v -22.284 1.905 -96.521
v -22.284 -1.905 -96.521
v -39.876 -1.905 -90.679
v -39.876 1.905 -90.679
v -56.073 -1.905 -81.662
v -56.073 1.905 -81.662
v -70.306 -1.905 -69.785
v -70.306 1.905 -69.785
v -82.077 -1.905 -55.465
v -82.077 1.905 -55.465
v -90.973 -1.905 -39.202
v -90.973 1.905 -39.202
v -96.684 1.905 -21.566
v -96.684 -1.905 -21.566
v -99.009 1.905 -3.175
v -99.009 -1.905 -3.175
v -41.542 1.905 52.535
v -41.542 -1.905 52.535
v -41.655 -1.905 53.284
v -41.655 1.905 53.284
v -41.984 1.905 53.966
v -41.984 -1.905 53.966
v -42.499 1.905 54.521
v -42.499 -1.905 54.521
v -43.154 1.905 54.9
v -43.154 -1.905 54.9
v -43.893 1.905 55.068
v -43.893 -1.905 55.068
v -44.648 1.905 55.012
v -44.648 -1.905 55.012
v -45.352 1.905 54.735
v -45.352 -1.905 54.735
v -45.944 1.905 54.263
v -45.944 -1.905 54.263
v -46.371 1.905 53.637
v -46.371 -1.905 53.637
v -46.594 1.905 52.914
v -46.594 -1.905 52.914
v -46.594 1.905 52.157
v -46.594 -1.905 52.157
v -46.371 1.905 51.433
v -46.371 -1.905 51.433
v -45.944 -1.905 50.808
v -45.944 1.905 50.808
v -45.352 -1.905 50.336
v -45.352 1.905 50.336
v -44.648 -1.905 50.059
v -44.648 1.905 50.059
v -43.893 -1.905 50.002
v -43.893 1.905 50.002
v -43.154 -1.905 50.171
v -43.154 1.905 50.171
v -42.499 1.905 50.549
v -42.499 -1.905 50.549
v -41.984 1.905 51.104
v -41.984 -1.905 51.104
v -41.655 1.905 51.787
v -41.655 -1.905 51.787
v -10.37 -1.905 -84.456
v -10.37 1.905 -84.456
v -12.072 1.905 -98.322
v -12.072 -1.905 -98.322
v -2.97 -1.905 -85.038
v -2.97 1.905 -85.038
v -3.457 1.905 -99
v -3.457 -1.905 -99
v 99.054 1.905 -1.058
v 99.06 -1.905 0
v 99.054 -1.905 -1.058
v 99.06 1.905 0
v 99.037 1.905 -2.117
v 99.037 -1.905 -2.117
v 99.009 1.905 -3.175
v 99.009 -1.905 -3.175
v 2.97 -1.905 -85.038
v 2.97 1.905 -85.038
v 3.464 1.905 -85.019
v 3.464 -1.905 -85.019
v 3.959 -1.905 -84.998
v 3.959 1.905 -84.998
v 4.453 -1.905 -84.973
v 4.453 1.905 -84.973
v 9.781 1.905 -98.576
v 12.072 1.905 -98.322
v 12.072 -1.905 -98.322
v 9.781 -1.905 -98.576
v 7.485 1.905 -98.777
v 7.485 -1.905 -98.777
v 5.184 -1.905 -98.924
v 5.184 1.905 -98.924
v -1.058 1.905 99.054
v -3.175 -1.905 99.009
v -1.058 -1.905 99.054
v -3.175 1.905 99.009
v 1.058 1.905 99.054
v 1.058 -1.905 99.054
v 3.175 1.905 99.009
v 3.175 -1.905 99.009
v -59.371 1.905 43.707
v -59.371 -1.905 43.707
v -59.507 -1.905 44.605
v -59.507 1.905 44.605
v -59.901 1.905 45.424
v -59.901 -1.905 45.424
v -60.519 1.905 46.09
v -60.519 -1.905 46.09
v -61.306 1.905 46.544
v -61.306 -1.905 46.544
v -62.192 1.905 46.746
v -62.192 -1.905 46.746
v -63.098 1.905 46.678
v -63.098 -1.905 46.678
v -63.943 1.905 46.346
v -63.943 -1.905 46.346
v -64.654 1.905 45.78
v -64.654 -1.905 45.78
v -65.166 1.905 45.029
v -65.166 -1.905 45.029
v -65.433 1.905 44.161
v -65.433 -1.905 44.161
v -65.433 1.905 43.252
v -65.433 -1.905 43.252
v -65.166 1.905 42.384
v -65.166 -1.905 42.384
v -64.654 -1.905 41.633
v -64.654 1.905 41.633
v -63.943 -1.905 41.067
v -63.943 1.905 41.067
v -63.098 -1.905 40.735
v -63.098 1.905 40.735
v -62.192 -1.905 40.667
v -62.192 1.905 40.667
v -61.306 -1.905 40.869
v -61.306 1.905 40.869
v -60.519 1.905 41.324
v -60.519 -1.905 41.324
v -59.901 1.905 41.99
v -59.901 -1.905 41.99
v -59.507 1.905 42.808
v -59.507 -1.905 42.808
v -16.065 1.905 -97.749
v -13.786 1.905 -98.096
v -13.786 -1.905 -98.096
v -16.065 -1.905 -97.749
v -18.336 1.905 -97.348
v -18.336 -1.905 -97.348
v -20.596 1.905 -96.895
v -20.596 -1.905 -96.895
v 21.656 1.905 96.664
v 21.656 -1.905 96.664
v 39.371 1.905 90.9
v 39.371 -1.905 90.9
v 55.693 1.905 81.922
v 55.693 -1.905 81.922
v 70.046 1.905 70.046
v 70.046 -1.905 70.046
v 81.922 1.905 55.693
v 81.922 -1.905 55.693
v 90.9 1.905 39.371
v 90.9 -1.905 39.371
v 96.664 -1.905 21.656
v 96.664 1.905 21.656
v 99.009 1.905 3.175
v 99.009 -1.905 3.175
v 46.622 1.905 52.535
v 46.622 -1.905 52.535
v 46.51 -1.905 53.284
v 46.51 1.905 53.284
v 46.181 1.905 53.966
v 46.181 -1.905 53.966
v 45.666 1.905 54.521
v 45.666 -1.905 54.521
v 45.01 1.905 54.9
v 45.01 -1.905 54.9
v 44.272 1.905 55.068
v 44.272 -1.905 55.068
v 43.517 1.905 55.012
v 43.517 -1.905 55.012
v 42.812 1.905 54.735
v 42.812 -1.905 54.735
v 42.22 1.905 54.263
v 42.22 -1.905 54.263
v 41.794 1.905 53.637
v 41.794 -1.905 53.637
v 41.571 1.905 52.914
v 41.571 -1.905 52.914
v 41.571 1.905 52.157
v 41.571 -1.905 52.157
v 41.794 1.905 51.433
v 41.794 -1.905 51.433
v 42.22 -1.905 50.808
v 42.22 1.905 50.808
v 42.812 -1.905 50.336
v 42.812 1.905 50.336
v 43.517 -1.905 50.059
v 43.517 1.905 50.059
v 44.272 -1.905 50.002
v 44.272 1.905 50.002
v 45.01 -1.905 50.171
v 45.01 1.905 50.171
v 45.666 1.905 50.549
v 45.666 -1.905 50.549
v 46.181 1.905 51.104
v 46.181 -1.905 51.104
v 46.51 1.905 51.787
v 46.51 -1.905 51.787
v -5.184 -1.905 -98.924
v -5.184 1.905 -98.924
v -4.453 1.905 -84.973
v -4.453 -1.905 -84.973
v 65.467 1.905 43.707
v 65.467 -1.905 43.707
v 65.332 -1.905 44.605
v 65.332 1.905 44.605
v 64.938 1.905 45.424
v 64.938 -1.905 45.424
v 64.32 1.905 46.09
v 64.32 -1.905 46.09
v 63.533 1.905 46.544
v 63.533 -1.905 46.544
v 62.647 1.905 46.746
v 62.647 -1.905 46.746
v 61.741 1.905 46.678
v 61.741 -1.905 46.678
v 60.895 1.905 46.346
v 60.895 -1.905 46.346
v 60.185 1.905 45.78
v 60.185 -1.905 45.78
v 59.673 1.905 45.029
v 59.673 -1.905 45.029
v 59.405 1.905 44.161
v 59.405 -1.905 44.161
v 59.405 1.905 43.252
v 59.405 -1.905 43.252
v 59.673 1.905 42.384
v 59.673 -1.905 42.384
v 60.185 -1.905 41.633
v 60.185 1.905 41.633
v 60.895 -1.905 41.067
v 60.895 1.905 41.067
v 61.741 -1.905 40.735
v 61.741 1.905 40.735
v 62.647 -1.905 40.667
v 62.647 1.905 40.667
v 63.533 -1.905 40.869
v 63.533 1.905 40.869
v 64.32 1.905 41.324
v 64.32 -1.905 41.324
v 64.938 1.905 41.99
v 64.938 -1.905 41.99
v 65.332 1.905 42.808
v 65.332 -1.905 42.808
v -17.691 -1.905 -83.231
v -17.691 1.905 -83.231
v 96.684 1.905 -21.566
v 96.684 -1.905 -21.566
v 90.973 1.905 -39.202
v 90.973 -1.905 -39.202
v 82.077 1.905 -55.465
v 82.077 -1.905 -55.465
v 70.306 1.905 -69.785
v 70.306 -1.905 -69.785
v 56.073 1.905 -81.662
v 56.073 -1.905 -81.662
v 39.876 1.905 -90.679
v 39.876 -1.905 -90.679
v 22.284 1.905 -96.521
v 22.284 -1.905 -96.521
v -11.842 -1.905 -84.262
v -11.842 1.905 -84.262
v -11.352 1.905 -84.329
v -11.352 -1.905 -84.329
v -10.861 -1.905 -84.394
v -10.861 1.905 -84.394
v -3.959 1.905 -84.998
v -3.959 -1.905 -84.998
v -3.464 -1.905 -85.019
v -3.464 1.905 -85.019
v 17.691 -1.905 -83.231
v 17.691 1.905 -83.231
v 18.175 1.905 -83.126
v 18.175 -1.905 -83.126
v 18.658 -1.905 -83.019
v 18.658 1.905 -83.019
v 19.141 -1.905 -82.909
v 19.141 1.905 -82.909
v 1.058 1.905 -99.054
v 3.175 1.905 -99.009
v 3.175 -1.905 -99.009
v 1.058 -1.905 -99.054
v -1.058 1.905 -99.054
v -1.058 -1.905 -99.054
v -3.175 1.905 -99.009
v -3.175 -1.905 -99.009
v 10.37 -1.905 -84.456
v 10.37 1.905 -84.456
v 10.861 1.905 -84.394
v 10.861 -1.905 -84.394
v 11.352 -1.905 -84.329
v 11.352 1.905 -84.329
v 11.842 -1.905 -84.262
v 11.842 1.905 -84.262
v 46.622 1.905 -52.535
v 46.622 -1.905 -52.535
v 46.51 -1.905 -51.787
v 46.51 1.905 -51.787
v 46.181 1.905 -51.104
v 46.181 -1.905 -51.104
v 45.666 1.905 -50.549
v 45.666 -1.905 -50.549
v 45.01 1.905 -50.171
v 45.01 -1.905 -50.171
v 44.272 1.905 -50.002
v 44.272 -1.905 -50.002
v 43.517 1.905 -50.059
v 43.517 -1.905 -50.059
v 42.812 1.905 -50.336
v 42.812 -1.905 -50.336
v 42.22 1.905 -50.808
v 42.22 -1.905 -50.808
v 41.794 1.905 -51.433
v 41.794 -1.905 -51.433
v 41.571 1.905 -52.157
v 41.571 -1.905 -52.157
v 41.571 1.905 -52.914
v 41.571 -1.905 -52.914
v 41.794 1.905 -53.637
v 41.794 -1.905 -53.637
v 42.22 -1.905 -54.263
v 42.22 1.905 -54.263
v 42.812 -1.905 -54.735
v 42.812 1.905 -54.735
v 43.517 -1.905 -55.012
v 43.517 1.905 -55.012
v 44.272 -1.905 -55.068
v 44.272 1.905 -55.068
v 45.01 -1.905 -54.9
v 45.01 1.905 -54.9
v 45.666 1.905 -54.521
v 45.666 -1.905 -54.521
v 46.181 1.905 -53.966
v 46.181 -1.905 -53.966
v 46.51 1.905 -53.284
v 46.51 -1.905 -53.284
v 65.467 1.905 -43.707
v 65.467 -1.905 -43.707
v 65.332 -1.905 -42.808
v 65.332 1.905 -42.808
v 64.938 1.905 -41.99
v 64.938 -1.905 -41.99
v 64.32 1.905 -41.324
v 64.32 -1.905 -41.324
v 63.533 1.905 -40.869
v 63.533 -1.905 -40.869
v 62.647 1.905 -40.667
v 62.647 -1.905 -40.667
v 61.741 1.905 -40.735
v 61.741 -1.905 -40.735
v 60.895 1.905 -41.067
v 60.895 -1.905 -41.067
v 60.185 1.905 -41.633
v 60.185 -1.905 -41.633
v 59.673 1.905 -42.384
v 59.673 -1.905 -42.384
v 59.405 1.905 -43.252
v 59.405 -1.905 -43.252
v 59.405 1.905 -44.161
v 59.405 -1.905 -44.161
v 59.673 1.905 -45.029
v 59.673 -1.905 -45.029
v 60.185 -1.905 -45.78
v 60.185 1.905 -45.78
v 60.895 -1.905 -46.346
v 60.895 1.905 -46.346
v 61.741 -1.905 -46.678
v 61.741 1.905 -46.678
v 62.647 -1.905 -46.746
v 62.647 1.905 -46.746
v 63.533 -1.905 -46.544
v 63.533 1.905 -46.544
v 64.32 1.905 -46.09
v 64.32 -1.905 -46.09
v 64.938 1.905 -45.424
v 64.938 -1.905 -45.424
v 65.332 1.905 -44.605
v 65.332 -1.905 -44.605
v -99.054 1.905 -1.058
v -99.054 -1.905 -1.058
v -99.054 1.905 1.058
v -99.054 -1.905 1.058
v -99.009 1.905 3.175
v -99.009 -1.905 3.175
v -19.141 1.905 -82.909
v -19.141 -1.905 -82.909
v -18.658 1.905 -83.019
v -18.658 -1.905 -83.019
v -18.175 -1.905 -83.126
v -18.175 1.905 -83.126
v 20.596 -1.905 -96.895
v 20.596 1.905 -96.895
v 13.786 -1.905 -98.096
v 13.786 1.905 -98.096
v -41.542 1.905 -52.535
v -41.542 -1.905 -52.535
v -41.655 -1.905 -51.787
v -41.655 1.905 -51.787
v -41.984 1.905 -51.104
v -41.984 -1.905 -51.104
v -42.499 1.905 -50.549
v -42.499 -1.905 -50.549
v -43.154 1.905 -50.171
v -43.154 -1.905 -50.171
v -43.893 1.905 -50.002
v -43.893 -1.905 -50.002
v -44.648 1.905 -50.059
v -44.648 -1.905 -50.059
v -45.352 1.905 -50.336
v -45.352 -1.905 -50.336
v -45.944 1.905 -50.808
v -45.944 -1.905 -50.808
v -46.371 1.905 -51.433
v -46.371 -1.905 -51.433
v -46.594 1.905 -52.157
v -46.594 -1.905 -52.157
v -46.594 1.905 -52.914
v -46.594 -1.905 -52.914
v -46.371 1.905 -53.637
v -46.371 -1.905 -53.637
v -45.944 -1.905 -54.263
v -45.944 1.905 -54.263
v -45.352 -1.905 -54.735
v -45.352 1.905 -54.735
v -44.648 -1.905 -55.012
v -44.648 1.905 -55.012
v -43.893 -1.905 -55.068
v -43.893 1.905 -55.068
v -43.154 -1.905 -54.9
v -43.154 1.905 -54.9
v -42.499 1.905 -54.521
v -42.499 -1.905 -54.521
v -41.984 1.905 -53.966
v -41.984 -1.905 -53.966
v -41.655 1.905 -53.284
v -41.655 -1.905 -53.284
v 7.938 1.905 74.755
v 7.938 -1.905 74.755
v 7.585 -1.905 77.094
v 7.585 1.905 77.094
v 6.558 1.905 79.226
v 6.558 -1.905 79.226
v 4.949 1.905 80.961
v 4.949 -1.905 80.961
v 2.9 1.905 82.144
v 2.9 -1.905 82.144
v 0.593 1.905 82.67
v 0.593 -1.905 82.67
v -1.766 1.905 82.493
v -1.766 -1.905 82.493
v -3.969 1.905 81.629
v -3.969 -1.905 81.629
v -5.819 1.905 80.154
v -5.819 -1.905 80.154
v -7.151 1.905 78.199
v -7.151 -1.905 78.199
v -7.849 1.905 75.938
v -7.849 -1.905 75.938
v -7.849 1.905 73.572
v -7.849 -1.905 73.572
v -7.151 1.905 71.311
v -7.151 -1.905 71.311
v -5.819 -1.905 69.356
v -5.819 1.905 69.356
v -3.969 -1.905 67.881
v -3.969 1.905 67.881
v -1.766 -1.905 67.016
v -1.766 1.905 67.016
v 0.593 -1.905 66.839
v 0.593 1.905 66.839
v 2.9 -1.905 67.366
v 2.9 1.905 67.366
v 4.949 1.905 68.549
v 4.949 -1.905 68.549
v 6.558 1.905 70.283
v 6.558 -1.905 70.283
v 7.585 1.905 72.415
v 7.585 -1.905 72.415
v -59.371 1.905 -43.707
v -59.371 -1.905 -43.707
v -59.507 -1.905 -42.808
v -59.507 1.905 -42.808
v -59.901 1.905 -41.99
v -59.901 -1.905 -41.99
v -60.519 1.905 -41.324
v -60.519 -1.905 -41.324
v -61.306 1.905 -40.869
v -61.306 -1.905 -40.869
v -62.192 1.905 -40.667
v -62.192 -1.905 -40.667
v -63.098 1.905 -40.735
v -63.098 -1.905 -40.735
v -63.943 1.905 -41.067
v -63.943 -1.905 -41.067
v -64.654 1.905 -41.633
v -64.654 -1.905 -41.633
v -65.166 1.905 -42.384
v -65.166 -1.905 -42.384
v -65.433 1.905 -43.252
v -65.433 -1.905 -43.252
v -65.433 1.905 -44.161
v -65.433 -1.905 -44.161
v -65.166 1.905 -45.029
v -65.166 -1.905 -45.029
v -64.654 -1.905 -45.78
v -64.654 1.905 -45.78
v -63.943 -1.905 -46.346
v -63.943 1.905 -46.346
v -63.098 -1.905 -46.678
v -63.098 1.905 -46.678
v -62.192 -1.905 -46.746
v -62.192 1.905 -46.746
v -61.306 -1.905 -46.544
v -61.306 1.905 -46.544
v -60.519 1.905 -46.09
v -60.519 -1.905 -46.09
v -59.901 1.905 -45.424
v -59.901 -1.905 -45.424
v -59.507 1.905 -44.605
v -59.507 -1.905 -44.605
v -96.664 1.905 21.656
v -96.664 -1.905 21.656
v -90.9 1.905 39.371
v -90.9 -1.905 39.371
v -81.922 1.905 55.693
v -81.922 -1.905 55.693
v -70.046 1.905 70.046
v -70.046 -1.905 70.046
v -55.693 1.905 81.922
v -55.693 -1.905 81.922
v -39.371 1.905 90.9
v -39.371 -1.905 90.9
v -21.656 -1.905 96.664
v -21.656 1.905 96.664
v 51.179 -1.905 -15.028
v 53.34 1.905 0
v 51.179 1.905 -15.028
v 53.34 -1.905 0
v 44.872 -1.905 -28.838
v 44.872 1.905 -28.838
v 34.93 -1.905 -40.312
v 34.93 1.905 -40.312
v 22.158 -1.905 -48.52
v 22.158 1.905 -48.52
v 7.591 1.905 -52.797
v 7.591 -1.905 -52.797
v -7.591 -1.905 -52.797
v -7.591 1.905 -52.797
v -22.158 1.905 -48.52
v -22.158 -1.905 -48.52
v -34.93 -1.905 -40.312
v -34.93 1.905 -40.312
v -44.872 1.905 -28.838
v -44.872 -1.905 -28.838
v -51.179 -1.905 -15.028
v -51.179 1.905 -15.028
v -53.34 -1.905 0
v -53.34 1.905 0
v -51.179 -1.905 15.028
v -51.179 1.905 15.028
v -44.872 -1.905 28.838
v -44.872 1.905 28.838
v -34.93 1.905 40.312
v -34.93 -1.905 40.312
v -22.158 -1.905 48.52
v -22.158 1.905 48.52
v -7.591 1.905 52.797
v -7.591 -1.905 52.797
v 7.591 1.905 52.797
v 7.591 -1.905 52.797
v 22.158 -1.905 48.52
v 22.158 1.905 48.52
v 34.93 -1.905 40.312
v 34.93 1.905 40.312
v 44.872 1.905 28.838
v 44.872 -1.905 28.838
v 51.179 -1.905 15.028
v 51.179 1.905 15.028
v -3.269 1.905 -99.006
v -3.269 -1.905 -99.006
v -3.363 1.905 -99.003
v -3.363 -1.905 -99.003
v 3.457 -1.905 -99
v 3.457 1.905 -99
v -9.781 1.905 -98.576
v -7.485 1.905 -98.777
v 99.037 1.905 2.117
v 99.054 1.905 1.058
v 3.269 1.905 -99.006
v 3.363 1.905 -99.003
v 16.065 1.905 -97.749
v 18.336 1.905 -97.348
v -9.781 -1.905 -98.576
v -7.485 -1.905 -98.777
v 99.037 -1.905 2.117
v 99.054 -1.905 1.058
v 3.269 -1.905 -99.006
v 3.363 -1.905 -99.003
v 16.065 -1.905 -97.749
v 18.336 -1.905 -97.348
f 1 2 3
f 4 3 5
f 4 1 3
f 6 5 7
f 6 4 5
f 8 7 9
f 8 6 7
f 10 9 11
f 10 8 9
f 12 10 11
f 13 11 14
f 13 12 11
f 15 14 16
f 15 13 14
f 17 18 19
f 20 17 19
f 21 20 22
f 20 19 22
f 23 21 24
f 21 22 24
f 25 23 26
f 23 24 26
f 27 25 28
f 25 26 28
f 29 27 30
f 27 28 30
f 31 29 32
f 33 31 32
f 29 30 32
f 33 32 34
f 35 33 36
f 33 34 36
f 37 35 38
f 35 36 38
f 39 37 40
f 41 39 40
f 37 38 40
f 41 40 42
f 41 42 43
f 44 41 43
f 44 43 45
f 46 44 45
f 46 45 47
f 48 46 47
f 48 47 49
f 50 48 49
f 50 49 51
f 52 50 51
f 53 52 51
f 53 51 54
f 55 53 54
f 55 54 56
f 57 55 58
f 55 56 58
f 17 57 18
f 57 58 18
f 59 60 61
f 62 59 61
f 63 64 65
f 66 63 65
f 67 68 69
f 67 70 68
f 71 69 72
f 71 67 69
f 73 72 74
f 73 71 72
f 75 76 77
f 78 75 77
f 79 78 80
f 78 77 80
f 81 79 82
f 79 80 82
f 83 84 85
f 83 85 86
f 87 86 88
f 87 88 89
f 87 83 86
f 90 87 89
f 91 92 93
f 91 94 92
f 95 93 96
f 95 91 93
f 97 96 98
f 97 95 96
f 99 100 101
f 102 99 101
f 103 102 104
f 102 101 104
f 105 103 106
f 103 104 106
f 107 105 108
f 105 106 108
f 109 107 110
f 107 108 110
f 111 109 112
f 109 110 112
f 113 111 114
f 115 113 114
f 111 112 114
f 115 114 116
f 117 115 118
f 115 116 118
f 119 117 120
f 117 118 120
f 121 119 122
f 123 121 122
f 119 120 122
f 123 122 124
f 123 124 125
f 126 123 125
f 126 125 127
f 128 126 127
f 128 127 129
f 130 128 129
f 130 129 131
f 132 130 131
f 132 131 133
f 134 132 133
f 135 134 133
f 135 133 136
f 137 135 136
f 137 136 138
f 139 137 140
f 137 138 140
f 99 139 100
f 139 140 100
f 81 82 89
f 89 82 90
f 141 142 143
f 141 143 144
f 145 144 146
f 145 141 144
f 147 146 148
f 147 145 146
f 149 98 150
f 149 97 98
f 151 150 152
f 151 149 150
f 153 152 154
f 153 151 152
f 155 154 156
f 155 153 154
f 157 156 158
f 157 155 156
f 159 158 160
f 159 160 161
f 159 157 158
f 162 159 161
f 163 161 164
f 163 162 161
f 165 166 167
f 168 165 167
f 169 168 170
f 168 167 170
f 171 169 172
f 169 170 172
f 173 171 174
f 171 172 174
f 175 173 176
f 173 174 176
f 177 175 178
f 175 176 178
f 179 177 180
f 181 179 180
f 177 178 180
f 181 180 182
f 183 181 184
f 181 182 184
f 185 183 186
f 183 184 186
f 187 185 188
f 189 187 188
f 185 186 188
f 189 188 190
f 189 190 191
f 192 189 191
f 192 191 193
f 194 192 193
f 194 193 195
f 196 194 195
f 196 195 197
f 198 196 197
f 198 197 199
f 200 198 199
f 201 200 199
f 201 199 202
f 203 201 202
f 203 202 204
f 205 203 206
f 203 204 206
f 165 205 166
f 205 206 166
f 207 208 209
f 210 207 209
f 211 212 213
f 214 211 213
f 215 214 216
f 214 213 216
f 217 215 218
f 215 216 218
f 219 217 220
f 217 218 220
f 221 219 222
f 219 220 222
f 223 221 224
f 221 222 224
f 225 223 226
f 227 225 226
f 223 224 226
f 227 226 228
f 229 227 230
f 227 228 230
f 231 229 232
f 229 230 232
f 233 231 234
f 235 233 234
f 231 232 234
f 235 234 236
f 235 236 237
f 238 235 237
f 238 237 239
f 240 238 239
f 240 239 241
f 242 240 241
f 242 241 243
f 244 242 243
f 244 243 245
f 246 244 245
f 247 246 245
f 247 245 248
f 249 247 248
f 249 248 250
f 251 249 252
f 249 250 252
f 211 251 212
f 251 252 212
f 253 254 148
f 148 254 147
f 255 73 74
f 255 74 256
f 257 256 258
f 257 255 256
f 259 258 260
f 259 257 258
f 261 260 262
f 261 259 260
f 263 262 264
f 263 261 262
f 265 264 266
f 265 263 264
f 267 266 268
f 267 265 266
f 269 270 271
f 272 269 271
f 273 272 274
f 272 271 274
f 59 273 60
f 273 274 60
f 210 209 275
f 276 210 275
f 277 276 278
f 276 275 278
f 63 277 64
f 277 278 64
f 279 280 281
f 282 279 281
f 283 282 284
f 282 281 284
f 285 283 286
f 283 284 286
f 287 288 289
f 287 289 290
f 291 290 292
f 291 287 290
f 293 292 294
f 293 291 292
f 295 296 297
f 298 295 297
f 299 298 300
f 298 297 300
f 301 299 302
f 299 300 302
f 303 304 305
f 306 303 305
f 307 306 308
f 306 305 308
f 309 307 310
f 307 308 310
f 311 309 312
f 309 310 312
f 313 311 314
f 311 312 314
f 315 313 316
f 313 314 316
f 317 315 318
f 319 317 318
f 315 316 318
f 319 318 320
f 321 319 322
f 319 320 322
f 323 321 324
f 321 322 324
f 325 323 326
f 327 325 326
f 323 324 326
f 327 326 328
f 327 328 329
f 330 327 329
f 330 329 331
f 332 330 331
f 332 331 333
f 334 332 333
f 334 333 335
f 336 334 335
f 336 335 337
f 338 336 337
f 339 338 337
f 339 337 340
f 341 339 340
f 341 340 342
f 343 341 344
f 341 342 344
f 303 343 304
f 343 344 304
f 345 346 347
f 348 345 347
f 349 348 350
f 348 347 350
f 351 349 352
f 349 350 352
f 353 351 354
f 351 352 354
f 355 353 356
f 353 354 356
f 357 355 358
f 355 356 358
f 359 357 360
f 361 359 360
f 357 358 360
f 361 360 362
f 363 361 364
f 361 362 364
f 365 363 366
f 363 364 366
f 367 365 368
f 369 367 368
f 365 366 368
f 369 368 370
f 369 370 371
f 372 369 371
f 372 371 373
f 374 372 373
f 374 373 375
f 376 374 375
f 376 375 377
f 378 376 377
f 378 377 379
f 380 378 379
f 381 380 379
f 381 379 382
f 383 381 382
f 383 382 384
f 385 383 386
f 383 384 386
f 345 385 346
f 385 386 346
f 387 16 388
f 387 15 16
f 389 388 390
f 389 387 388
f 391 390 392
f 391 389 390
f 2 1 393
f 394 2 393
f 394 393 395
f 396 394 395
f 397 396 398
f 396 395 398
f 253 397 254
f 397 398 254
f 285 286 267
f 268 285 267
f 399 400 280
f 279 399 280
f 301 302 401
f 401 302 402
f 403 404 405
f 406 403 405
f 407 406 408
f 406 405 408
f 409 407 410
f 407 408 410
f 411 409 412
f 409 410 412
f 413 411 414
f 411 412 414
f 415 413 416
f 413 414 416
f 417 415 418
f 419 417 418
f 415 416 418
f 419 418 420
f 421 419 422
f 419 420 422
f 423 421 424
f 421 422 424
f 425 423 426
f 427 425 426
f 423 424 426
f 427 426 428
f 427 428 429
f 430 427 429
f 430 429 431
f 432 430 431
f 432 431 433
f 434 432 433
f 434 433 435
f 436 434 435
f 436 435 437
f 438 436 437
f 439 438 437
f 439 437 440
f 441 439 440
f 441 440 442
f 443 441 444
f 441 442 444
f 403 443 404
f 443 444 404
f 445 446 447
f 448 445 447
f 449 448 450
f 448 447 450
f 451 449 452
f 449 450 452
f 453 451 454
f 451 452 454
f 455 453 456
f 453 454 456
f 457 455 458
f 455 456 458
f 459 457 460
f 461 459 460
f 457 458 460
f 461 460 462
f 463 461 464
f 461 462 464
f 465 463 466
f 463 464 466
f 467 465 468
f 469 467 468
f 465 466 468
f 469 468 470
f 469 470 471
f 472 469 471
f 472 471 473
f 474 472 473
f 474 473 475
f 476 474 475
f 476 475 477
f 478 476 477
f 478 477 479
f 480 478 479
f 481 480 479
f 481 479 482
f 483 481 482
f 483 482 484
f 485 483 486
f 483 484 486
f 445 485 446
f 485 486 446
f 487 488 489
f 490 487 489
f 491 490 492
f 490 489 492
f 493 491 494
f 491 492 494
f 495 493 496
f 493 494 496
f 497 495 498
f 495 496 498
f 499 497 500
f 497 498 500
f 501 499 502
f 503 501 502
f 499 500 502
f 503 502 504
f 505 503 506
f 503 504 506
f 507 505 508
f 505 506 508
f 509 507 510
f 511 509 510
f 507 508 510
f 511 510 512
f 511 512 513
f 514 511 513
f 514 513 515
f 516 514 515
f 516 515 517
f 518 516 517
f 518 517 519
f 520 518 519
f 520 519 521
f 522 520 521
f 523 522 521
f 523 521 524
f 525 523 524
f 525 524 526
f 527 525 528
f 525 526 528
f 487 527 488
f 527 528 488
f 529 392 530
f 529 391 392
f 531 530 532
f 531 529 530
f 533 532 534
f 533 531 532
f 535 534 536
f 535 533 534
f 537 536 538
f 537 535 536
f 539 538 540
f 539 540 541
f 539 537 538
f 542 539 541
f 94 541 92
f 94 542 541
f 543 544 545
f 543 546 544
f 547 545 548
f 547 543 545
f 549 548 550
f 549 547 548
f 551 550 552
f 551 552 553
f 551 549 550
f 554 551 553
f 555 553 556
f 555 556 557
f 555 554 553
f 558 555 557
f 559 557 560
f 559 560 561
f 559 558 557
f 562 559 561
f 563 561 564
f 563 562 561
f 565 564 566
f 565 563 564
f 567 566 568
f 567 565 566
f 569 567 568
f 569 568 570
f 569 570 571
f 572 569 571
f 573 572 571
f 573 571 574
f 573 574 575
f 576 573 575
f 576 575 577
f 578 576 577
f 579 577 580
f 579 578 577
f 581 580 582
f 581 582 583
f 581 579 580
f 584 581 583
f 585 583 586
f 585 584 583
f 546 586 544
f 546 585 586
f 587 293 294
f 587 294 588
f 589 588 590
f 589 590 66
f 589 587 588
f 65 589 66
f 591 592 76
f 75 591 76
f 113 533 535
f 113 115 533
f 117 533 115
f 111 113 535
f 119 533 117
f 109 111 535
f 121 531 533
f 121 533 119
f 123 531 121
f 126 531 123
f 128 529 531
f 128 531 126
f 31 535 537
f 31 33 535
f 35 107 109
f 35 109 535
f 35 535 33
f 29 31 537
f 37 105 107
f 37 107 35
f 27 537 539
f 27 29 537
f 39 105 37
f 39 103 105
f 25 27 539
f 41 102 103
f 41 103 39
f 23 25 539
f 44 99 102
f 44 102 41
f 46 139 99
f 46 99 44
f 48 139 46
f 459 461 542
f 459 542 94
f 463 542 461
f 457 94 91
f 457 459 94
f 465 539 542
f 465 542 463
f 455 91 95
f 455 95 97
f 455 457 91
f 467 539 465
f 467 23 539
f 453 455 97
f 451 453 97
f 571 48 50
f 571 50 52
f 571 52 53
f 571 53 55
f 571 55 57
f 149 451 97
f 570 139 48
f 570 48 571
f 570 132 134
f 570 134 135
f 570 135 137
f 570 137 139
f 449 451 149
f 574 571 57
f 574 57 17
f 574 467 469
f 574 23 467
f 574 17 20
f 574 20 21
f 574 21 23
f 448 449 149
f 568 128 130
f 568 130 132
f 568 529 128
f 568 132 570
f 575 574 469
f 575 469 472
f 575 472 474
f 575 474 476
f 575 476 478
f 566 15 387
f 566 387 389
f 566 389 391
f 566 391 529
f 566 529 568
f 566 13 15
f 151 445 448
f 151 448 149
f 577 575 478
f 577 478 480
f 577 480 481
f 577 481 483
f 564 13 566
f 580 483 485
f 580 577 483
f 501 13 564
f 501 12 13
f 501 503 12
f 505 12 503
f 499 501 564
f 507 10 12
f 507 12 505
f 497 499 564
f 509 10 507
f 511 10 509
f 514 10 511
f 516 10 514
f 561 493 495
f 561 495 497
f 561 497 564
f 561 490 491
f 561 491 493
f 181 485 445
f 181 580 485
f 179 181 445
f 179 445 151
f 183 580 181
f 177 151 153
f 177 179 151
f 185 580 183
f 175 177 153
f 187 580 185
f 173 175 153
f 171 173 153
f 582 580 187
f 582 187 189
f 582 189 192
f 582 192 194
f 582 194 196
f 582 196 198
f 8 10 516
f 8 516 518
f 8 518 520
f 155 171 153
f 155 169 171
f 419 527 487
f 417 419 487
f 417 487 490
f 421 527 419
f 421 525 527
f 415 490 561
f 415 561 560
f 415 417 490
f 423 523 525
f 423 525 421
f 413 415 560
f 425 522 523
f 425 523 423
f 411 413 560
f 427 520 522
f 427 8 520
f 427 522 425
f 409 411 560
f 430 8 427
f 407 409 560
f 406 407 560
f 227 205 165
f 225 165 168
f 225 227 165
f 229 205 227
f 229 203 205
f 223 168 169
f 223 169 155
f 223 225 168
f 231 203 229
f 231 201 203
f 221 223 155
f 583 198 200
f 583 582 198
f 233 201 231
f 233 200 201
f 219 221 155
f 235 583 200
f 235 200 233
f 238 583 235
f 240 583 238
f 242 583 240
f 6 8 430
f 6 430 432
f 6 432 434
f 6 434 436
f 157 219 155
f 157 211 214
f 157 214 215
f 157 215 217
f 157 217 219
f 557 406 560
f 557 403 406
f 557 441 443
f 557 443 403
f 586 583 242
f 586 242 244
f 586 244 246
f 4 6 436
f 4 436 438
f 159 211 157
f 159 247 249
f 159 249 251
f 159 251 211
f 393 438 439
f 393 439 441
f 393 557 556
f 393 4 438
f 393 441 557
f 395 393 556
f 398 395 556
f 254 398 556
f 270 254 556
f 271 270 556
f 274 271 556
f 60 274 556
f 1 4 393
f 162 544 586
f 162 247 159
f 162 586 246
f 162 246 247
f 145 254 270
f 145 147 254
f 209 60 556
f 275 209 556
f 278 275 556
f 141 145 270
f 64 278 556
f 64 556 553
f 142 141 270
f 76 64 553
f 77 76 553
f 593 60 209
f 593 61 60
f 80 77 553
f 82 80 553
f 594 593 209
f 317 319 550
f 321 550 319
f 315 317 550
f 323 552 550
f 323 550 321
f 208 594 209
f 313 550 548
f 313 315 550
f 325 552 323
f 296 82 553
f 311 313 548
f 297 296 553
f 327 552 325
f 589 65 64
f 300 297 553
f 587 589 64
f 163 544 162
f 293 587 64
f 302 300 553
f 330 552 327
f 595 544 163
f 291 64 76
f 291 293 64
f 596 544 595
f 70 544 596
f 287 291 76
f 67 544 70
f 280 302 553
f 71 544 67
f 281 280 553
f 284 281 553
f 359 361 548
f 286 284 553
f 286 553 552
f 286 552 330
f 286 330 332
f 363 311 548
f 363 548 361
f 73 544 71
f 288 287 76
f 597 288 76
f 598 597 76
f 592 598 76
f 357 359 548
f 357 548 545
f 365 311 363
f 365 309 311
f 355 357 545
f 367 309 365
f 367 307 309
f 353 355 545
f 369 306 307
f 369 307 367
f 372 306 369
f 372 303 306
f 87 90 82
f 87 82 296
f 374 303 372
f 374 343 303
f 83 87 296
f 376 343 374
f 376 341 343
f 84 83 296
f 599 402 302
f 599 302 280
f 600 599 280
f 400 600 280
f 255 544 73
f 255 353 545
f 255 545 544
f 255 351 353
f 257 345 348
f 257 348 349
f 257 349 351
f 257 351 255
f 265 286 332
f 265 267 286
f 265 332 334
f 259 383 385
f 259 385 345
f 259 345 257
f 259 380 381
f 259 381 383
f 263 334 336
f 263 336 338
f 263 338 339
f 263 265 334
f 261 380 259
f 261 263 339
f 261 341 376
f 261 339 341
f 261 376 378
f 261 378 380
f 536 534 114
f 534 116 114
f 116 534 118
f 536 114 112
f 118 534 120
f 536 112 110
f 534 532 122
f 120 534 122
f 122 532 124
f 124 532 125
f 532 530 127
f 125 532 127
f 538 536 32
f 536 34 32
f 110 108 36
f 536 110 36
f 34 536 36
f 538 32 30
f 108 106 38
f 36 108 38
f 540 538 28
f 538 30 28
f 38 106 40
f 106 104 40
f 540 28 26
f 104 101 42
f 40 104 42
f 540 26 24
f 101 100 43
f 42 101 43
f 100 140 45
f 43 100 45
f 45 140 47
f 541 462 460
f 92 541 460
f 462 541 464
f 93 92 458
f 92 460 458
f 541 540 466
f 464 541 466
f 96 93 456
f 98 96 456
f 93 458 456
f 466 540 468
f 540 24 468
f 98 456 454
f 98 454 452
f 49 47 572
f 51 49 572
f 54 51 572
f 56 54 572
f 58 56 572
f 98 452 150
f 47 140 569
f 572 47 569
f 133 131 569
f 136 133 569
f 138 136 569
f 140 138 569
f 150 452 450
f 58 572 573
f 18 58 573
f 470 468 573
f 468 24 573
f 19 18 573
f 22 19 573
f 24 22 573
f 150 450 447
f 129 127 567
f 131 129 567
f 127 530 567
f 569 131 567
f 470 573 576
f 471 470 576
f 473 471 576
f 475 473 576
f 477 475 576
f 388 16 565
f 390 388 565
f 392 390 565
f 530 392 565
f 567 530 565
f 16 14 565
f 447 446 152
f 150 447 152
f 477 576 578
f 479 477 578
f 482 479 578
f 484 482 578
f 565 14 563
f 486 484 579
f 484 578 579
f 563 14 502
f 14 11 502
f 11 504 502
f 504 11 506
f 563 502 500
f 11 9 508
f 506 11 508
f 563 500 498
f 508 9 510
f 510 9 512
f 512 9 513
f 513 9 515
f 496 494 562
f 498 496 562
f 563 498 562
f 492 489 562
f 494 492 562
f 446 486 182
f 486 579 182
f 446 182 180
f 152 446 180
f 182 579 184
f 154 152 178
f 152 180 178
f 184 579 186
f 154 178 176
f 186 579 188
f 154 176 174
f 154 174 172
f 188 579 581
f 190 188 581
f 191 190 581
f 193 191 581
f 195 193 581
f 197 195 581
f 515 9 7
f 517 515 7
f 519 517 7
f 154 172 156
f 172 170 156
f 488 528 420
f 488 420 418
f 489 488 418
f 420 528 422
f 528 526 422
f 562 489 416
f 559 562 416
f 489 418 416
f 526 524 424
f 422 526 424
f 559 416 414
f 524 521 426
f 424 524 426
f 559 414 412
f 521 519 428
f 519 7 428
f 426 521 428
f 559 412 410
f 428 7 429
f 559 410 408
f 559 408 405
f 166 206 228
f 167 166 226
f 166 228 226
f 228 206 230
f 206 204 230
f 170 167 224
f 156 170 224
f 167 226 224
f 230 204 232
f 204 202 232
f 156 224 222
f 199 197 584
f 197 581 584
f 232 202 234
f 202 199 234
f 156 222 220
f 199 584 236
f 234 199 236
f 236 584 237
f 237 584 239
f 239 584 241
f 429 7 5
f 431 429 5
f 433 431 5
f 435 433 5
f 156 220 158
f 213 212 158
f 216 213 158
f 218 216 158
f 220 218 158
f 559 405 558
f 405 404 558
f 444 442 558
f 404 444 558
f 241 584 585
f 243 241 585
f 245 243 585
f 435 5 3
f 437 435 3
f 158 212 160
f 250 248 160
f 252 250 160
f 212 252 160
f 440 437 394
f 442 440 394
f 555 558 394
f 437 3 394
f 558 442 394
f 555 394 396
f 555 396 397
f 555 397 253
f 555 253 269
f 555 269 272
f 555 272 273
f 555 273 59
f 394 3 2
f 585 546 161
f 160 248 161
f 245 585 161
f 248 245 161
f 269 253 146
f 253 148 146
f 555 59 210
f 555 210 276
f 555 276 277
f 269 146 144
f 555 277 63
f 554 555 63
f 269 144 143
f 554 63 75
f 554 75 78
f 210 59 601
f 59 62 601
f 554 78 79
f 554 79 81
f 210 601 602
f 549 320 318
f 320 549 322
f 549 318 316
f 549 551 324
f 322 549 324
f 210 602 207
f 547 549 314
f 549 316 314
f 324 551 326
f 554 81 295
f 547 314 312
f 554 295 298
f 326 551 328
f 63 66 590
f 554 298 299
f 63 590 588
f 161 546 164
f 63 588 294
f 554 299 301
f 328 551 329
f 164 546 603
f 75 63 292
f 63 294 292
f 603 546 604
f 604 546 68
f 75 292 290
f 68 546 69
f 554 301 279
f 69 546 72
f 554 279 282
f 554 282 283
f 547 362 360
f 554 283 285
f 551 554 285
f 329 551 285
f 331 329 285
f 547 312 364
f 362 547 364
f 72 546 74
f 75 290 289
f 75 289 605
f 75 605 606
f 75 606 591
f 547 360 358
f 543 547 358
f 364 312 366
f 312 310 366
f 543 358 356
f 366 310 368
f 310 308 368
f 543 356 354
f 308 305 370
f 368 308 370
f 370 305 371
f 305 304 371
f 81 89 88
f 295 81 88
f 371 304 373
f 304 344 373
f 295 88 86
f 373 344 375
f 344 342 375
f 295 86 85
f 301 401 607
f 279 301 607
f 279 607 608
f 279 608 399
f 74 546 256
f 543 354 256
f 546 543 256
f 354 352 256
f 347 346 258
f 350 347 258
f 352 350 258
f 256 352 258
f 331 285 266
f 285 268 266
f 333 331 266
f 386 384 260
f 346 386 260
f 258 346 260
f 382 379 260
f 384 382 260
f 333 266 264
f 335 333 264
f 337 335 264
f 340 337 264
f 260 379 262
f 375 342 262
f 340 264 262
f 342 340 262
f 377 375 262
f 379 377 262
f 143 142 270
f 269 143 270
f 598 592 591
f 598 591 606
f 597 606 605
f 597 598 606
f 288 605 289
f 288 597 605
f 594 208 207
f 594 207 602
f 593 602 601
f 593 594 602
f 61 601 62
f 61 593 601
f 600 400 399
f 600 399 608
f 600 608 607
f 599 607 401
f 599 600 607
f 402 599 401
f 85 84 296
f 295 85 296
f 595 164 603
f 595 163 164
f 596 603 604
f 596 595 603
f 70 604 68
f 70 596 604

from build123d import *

# Parameters (mm, degrees)
F_98MM_6ID_CENTERING_RING_SKETCH_R = 53.34
CENTERING_RING_EXTRUDE_DEPTH       = 1.905
CENTERING_RING_EXTRUDE_DEPTH_BACK  = 1.905
CUT_EXTRUDE3_DEPTH                 = 4.81
CIRPATTERN1_COUNT                  = 6
CIRPATTERN1_ANGLE                  = 25
SKETCH5_R                          = 3.048
SKETCH5_R_2                        = 2.54
SKETCH5_R_3                        = 7.9375
CUT_EXTRUDE4_DEPTH                 = 3.81


with BuildPart() as part:
    # 98mm - 6ID centering ring sketch → Centering Ring Extrude (new body, two sides)
    with BuildSketch(Plane(origin=(0, 0, 0), x_dir=(1, 0, 0), z_dir=(0, 1, 0))) as centering_ring_extrude_sk:
        with BuildLine():
            Line((56.425744124, 3.175), (99.009105516, 3.175))
            ThreePointArc((99.009105516, 3.175), (70.045997744, 70.045997744), (3.175, 99.009105516))
            Line((3.175, 99.009105516), (3.175, 56.425744124))
            ThreePointArc((3.175, 56.425744124), (0, 56.515), (-3.175, 56.425744124))
            Line((-3.175, 56.425744124), (-3.175, 99.009105516))
            ThreePointArc((-3.175, 99.009105516), (-70.045997744, 70.045997744), (-99.009105516, 3.175))
            Line((-99.009105516, 3.175), (-56.425744124, 3.175))
            ThreePointArc((-56.425744124, 3.175), (-56.515, 0), (-56.425744124, -3.175))
            Line((-56.425744124, -3.175), (-99.009105516, -3.175))
            ThreePointArc((-99.009105516, -3.175), (-70.045997744, -70.045997744), (-3.175, -99.009105516))
            Line((-3.175, -99.009105516), (-3.175, -56.425744124))
            ThreePointArc((-3.175, -56.425744124), (0, -56.515), (3.175, -56.425744124))
            Line((3.175, -56.425744124), (3.175, -99.009105516))
            ThreePointArc((3.175, -99.009105516), (70.045997744, -70.045997744), (99.009105516, -3.175))
            Line((99.009105516, -3.175), (56.425744124, -3.175))
            ThreePointArc((56.425744124, -3.175), (56.515, 0), (56.425744124, 3.175))
        make_face()
        Circle(F_98MM_6ID_CENTERING_RING_SKETCH_R, mode=Mode.SUBTRACT)
        with BuildLine():
            ThreePointArc((99.06, 0), (99.047275562, 1.587703943), (99.009105516, 3.175))
            Line((99.009105516, 3.175), (56.425744124, 3.175))
            ThreePointArc((56.425744124, 3.175), (56.515, 0), (56.425744124, -3.175))
            Line((56.425744124, -3.175), (99.009105516, -3.175))
            ThreePointArc((99.009105516, -3.175), (99.047275562, -1.587703943), (99.06, 0))
        make_face()
        with BuildLine():
            Line((3.175, 56.425744124), (3.175, 99.009105516))
            ThreePointArc((3.175, 99.009105516), (0, 99.06), (-3.175, 99.009105516))
            Line((-3.175, 99.009105516), (-3.175, 56.425744124))
            ThreePointArc((-3.175, 56.425744124), (0, 56.515), (3.175, 56.425744124))
        make_face()
        with BuildLine():
            Line((-56.425744124, 3.175), (-99.009105516, 3.175))
            ThreePointArc((-99.009105516, 3.175), (-99.06, 0), (-99.009105516, -3.175))
            Line((-99.009105516, -3.175), (-56.425744124, -3.175))
            ThreePointArc((-56.425744124, -3.175), (-56.515, 0), (-56.425744124, 3.175))
        make_face()
        with BuildLine():
            ThreePointArc((-3.175, -99.009105516), (0, -99.06), (3.175, -99.009105516))
            Line((3.175, -99.009105516), (3.175, -56.425744124))
            ThreePointArc((3.175, -56.425744124), (0, -56.515), (-3.175, -56.425744124))
            Line((-3.175, -56.425744124), (-3.175, -99.009105516))
        make_face()
    extrude(amount=CENTERING_RING_EXTRUDE_DEPTH)
    extrude(centering_ring_extrude_sk.sketch, amount=-CENTERING_RING_EXTRUDE_DEPTH_BACK)

    # Sketch3 → Cut-Extrude3 (cut, through all)
    with BuildSketch(Plane(origin=(0, 1.905, 0), x_dir=(1, 0, 0), z_dir=(0, 1, 0))):
        with BuildLine():
            Line((-22.283651443, 96.521098618), (-19.141085214, 82.909148813))
            ThreePointArc((-19.141085214, 82.909148813), (-18.41684675, 83.073027246), (-17.691205772, 83.230579346))
            Line((-17.691205772, 83.230579346), (-20.595732092, 96.895301329))
            ThreePointArc((-20.595732092, 96.895301329), (-21.440508157, 96.711882465), (-22.283651443, 96.521098618))
        make_face()
    cut_extrude3 = extrude(amount=-CUT_EXTRUDE3_DEPTH, mode=Mode.SUBTRACT)

    # CirPattern1: Cut-Extrude3 ×6 about axis
    cirpattern1_axis = Axis((0, 0, 0), (0, -1, 0))
    for i in range(1, CIRPATTERN1_COUNT):
        add(cut_extrude3.rotate(cirpattern1_axis, i * CIRPATTERN1_ANGLE / (CIRPATTERN1_COUNT - 1)), mode=Mode.SUBTRACT)

    # Sketch5 → Cut-Extrude4 (cut)
    with BuildSketch(Plane.XZ.offset(1.905)):
        with Locations((-62.419385775, 43.70652445)):
            Circle(SKETCH5_R)
        with Locations((-44.082374272, 52.535327909)):
            Circle(SKETCH5_R_2)
        with Locations((44.082374272, 52.535327909)):
            Circle(SKETCH5_R_2)
        with Locations((62.419385775, 43.70652445)):
            Circle(SKETCH5_R)
        with Locations((62.419385775, -43.70652445)):
            Circle(SKETCH5_R)
        with Locations((44.082374272, -52.535327909)):
            Circle(SKETCH5_R_2)
        with Locations((-44.082374272, -52.535327909)):
            Circle(SKETCH5_R_2)
        with Locations((-62.419385775, -43.70652445)):
            Circle(SKETCH5_R)
        with Locations((0, 74.75474)):
            Circle(SKETCH5_R_3)
    extrude(amount=-CUT_EXTRUDE4_DEPTH, mode=Mode.SUBTRACT)


solid = part.part
